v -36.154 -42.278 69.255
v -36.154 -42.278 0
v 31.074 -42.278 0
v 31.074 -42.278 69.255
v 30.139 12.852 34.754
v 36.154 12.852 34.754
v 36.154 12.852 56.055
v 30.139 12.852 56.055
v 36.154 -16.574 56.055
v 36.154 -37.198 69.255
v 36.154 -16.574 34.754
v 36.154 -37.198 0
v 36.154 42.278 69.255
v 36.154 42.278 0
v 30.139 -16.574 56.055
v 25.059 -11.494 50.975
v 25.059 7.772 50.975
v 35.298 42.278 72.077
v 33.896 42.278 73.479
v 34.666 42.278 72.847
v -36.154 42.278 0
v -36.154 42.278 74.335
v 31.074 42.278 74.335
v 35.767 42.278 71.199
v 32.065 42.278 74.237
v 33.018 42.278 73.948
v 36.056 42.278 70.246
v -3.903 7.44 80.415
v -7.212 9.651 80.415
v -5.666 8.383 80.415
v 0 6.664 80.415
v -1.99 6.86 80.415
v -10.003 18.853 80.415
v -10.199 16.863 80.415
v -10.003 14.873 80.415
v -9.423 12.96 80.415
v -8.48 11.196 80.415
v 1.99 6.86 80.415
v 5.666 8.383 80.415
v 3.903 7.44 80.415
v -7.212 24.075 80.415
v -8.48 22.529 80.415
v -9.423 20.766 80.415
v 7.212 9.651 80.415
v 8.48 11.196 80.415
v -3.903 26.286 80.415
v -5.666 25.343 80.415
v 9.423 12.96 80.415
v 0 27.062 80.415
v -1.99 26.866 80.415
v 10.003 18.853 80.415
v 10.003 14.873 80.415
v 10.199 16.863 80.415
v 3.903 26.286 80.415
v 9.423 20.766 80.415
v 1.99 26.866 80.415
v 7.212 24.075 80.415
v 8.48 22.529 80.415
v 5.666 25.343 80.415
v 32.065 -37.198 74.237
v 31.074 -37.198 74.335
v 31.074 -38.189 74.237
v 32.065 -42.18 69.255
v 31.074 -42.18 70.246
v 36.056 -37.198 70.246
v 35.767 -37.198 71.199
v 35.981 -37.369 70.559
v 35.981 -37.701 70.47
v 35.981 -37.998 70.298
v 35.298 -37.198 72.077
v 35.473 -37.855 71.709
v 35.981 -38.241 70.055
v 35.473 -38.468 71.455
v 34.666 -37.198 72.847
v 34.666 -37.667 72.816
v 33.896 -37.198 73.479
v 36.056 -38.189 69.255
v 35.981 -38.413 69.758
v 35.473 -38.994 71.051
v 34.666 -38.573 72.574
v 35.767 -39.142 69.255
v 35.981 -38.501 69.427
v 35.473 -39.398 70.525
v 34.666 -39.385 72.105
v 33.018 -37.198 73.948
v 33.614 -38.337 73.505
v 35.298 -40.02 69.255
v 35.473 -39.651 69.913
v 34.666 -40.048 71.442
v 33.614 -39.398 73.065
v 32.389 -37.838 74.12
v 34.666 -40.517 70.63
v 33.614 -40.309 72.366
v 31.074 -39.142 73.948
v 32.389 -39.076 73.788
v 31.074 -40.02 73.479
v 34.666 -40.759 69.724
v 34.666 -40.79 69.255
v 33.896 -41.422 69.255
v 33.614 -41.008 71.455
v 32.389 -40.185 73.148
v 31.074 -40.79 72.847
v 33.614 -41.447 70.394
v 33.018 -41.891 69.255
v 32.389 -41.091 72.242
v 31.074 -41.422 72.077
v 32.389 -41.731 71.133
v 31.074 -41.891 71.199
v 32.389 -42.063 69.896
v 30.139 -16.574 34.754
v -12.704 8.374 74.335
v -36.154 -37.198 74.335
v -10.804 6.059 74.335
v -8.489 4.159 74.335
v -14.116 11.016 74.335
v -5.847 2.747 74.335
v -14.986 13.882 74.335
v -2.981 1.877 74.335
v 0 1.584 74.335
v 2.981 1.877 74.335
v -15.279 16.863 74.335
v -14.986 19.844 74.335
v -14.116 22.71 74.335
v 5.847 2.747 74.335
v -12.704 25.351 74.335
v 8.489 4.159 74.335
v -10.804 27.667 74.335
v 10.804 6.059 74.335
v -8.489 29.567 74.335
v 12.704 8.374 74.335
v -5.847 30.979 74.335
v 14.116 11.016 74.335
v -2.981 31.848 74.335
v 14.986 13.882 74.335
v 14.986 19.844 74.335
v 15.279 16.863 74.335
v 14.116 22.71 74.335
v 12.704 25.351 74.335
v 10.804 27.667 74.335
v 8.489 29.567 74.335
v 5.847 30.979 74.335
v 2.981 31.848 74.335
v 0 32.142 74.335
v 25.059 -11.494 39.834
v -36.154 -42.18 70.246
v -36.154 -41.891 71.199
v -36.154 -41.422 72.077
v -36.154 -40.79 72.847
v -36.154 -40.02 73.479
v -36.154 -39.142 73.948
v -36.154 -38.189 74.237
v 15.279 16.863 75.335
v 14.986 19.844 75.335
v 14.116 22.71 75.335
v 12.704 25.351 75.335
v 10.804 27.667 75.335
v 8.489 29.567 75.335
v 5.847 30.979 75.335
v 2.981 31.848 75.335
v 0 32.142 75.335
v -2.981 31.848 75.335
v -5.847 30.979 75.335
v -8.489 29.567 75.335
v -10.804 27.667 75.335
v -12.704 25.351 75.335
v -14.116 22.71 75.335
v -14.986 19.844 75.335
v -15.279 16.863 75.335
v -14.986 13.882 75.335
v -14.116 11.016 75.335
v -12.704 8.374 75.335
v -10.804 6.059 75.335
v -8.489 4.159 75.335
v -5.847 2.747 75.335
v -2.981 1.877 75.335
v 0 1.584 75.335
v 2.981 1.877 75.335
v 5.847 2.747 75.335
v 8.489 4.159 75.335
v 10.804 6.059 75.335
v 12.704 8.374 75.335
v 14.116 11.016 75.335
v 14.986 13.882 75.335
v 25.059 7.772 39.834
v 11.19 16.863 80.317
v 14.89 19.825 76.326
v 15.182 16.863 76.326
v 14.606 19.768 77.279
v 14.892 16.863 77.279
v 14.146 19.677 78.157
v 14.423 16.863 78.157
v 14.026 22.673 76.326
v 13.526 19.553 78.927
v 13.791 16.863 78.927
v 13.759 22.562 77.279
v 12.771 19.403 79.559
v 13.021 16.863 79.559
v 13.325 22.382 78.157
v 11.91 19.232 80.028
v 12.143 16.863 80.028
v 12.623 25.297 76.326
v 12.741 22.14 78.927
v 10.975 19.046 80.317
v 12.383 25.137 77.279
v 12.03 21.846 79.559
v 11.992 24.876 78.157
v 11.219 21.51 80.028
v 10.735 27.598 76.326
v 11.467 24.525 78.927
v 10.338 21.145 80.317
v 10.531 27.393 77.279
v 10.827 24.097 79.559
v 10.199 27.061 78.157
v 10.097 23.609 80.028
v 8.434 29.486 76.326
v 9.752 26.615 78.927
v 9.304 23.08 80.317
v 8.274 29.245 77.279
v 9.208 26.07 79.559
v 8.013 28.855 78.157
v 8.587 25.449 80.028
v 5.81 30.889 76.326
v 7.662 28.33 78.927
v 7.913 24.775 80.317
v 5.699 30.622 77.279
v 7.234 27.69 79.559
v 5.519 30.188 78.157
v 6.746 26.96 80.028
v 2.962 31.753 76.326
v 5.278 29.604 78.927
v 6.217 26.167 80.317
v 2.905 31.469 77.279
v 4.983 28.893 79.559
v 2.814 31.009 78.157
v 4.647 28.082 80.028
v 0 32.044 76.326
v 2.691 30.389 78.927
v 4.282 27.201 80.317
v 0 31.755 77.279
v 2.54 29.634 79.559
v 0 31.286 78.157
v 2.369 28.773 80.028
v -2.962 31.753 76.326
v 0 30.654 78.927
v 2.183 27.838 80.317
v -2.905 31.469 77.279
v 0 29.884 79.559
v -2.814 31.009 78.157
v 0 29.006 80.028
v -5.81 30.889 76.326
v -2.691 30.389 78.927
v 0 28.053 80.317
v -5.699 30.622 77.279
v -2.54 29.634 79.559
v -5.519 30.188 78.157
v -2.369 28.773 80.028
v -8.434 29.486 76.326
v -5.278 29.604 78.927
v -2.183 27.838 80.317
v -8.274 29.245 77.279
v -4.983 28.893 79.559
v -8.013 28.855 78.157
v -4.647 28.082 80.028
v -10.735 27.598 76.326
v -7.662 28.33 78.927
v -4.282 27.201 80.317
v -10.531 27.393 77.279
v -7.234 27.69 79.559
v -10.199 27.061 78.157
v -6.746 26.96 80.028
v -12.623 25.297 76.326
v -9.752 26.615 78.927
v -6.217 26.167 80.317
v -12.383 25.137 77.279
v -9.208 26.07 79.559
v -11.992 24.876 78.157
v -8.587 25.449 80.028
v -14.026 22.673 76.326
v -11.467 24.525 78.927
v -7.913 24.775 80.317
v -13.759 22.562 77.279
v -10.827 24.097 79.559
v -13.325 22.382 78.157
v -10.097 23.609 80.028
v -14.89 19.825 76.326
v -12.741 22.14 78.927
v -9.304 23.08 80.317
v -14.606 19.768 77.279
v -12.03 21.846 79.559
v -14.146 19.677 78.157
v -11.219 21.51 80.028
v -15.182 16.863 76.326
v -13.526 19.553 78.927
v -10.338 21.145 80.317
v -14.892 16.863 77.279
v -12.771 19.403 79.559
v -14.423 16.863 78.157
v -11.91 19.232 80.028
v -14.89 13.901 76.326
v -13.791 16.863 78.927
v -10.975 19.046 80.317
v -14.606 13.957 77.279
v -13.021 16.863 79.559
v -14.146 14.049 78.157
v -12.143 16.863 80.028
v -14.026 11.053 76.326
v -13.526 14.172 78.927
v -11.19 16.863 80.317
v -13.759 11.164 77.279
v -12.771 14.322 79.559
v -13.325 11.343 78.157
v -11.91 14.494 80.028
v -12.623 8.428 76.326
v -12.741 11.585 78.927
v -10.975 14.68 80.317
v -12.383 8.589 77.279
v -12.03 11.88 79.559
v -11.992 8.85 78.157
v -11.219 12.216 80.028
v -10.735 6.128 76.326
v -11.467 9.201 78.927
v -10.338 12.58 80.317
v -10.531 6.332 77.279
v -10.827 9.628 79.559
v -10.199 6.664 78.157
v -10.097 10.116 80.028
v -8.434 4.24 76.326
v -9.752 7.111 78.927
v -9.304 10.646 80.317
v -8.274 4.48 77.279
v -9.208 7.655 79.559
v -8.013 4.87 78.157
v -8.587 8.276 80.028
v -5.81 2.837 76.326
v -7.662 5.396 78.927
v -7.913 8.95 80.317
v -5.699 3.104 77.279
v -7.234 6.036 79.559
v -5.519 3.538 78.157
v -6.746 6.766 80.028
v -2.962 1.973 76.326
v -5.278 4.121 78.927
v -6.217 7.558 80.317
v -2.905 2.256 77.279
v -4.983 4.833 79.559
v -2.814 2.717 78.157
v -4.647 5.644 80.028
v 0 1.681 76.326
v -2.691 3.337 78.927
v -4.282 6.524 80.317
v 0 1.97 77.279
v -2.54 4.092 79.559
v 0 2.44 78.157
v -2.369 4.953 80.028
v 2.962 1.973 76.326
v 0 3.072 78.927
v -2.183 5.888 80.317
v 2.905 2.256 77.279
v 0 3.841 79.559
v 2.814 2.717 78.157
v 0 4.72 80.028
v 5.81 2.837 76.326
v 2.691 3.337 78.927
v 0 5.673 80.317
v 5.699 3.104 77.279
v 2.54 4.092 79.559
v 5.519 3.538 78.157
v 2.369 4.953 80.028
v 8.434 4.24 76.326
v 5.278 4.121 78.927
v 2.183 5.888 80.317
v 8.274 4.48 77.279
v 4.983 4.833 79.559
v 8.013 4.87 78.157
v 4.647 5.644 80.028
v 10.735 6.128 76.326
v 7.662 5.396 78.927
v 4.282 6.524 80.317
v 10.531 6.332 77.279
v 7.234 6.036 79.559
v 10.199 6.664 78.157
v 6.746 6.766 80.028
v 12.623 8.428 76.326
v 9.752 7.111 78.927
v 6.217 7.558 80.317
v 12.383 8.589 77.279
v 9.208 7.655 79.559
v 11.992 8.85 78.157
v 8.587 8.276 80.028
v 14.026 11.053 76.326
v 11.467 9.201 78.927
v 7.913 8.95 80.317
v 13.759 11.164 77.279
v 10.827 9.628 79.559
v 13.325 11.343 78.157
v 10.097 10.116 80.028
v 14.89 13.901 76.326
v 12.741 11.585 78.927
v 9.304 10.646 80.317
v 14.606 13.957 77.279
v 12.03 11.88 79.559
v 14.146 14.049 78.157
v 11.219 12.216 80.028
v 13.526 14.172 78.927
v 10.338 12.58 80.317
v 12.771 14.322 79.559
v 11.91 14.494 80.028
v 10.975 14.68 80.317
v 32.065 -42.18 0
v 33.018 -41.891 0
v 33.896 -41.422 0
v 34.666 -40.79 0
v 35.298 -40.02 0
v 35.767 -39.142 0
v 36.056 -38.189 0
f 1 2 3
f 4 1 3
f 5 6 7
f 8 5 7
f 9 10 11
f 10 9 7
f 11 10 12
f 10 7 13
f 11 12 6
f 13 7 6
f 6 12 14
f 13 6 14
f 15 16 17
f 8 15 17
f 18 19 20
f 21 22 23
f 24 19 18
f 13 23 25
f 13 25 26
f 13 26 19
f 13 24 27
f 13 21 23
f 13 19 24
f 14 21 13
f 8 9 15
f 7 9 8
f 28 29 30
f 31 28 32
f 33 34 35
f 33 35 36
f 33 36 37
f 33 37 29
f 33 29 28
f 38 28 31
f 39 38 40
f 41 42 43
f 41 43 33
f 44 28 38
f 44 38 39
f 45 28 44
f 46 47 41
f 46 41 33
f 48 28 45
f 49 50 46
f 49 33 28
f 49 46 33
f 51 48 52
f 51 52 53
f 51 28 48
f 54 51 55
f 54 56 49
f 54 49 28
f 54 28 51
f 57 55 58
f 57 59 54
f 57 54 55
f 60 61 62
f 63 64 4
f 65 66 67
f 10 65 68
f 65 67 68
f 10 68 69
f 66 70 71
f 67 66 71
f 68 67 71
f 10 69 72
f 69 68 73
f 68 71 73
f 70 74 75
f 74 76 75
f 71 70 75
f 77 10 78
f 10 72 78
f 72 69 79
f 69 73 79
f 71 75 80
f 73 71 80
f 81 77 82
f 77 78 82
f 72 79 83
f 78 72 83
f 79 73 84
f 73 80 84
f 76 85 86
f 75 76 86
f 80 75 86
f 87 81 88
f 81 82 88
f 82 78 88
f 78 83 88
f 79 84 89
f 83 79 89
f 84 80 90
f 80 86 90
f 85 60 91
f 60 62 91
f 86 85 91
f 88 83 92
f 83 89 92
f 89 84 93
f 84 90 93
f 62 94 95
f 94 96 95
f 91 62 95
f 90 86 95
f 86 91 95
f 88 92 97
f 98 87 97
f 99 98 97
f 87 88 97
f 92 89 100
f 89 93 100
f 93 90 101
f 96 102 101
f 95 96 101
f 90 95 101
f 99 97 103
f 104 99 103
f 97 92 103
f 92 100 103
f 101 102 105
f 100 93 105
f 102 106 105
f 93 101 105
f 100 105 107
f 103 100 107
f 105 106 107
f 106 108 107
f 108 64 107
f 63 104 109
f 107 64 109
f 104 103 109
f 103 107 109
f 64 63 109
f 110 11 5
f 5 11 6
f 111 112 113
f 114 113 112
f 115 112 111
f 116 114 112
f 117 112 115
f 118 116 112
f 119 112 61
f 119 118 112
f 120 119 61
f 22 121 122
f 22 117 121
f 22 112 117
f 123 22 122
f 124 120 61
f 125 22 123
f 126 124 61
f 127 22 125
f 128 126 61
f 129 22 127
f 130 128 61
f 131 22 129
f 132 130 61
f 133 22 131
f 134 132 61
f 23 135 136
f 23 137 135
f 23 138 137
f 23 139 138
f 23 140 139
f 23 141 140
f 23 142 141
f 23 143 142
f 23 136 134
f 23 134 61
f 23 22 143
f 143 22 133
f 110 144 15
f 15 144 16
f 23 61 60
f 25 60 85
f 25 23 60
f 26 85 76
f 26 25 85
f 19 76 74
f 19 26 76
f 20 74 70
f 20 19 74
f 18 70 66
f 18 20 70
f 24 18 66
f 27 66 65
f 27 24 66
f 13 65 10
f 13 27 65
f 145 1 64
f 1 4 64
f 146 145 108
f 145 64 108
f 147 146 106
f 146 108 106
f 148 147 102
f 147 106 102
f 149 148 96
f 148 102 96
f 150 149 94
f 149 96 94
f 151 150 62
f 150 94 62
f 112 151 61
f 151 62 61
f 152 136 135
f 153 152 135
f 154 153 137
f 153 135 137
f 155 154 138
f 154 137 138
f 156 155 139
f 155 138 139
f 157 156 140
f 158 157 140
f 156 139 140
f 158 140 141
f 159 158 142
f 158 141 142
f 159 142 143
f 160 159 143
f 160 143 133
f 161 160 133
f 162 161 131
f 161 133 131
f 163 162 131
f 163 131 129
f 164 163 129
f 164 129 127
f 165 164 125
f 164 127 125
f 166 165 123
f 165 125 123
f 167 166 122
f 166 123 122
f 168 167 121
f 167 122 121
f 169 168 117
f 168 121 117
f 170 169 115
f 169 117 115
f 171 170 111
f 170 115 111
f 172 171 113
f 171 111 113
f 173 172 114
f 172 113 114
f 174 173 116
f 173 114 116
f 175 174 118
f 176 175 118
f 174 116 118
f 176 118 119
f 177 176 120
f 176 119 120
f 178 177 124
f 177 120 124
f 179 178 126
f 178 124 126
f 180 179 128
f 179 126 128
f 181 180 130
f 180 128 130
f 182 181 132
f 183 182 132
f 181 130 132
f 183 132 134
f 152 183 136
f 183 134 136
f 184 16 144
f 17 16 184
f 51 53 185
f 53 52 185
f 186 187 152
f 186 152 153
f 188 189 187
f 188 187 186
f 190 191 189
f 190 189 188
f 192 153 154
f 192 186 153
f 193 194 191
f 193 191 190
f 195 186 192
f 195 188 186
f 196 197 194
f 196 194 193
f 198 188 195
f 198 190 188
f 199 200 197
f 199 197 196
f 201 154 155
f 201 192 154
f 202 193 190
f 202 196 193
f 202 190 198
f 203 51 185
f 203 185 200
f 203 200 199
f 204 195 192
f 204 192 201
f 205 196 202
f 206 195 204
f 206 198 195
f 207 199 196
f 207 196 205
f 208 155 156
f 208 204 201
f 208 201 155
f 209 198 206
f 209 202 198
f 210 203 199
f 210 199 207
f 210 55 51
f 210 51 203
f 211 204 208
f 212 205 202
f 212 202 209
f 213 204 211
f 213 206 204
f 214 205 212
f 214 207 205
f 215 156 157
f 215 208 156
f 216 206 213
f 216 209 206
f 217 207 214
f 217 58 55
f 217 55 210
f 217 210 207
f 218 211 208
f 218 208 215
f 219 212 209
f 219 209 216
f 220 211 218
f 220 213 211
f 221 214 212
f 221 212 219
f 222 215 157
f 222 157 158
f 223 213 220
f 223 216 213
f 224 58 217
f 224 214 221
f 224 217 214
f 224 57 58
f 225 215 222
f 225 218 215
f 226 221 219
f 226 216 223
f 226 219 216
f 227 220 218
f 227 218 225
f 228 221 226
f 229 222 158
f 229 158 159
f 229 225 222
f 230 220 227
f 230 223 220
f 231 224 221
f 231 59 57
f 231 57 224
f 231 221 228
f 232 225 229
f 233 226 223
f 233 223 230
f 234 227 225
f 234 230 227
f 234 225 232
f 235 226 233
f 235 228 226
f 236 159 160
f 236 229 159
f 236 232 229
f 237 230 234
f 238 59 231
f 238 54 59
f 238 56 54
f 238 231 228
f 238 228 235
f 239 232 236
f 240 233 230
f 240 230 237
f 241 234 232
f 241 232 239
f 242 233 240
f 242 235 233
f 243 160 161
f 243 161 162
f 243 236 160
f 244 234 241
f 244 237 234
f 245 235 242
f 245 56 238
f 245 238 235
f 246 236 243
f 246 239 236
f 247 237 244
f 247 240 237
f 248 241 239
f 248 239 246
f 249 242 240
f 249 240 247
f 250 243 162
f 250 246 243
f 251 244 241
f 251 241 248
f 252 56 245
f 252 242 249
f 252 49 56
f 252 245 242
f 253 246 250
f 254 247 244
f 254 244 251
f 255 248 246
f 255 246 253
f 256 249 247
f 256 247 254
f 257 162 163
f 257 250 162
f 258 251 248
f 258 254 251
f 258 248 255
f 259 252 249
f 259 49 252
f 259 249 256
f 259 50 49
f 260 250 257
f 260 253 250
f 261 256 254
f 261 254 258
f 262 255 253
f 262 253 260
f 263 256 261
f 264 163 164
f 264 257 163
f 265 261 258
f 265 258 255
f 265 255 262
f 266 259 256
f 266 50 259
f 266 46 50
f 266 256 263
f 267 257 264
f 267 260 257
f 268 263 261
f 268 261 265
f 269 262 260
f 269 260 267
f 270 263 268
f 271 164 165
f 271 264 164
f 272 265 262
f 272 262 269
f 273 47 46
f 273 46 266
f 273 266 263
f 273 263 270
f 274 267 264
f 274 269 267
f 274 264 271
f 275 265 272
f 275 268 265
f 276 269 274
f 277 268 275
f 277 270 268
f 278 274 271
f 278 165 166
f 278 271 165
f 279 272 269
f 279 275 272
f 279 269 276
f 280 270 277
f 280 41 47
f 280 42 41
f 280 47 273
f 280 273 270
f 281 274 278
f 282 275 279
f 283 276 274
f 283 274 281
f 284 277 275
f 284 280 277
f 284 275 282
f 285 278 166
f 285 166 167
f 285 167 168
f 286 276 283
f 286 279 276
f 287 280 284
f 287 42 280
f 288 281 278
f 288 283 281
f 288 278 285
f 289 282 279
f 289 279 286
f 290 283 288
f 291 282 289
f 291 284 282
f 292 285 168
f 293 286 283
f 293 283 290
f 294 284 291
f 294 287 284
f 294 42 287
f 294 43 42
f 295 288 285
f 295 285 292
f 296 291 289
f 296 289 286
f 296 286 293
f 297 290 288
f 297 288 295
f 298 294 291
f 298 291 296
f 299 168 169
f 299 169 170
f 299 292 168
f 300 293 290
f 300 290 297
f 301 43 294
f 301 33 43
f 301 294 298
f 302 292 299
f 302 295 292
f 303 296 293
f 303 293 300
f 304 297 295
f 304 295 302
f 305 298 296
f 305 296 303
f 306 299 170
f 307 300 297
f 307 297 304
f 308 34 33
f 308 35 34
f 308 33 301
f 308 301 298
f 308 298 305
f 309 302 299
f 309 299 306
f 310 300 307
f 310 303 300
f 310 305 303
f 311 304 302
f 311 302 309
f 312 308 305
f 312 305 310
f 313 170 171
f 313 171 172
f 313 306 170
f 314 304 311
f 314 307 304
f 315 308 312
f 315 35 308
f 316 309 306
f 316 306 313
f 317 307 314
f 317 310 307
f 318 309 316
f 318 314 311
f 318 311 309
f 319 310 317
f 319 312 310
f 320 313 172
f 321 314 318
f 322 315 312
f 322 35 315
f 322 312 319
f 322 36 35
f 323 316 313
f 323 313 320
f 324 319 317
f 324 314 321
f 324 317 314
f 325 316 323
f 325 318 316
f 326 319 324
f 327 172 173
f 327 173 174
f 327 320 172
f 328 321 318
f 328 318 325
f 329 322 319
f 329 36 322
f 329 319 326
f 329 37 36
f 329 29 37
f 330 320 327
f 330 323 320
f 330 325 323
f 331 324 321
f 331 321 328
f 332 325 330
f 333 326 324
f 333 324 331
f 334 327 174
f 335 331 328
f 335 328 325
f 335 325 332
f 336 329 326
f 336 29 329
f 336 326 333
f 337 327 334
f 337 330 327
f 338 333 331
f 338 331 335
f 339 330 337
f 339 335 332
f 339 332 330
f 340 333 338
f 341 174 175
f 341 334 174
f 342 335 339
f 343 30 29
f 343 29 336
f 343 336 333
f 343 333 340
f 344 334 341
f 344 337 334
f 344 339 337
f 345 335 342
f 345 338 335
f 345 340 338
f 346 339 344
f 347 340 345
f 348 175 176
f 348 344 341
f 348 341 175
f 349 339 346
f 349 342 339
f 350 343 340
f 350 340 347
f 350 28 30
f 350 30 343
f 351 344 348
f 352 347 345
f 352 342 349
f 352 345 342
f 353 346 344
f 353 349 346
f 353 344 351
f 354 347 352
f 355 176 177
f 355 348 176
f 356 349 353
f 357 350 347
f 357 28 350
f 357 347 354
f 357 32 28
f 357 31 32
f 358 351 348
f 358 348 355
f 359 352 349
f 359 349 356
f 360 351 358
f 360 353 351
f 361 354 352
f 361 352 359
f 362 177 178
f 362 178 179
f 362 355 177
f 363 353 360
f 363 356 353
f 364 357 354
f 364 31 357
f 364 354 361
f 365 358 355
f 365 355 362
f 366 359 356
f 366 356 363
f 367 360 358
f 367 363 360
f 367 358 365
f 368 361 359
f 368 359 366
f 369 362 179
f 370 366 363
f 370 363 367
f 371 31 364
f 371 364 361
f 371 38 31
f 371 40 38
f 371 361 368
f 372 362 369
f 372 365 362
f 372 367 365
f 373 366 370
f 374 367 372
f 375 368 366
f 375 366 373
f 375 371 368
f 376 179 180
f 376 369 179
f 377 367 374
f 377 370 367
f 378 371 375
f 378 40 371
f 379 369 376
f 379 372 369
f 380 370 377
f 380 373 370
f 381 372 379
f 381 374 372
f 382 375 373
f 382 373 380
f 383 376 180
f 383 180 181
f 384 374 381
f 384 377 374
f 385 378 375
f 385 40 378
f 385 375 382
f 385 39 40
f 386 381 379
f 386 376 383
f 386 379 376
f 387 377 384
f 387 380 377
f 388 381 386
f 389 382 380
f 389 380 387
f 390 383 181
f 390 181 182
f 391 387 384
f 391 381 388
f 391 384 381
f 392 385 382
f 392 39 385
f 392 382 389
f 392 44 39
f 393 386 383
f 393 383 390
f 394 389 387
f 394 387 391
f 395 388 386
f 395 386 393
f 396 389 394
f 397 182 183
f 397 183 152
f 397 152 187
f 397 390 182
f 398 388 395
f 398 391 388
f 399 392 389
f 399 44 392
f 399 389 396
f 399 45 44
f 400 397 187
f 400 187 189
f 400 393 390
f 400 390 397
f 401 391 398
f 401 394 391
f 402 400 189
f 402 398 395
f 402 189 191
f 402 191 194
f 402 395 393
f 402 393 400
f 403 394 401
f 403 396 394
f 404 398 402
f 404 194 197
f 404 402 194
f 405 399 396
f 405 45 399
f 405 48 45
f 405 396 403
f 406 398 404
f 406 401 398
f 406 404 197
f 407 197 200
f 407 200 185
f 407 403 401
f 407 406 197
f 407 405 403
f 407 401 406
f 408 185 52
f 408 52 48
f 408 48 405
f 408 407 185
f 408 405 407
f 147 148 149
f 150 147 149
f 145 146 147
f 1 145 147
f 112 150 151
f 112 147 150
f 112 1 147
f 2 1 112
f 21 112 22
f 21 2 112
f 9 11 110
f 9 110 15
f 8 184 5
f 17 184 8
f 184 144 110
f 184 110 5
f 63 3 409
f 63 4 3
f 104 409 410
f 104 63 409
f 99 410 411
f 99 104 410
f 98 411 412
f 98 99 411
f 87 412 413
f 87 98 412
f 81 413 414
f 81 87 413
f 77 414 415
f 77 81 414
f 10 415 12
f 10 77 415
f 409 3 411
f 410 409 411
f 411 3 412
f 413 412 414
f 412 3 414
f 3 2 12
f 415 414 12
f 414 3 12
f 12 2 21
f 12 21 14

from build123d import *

# Parameters (mm, degrees)
F0_W     = 72.307944
F0_H     = 84.555768
F1_DEPTH = 74.3351
F2_R     = 15.279169
F3_DEPTH = 6.079547
F4_R     = 5.08
F5_W     = 29.425662
F5_H     = 21.301456
F6_DEPTH = 11.095189
F7_SIZE  = 5.08


with BuildPart() as f1:
    # F0 (on Top) → F1 (new body)
    with BuildSketch(Plane.XY):
        Rectangle(F0_W, F0_H)
    extrude(amount=F1_DEPTH)

    # F2 (on face) → F3 (join)
    with BuildSketch(Plane.XY.offset(74.3351)):
        with Locations((0, 16.862802)):
            Circle(F2_R)
    extrude(amount=F3_DEPTH)

    # F4
    f4_edges = [f1.edges().sort_by_distance(p)[0] for p in [
        (-15.279169, 16.862802, 80.414647),
        (0, -42.277884, 74.3351),
        (36.153972, 0, 74.3351),
        (36.153972, -42.277884, 37.16755),
    ]]
    fillet(f4_edges, radius=F4_R)

    # F5 (on face) → F6 (cut)
    with BuildSketch(Plane.YZ.offset(36.153972)):
        with Locations((-1.861071, 45.404758)):
            Rectangle(F5_W, F5_H)
    extrude(amount=-F6_DEPTH, mode=Mode.SUBTRACT)

    # F7
    f7_edges = [f1.edges().sort_by_distance(p)[0] for p in [
        (25.058783, -1.861071, 56.055486),
        (25.058783, -16.573902, 45.404758),
        (25.058783, -1.861071, 34.75403),
        (25.058783, 12.85176, 45.404758),
    ]]
    chamfer(f7_edges, length=F7_SIZE)


solid = f1.part
